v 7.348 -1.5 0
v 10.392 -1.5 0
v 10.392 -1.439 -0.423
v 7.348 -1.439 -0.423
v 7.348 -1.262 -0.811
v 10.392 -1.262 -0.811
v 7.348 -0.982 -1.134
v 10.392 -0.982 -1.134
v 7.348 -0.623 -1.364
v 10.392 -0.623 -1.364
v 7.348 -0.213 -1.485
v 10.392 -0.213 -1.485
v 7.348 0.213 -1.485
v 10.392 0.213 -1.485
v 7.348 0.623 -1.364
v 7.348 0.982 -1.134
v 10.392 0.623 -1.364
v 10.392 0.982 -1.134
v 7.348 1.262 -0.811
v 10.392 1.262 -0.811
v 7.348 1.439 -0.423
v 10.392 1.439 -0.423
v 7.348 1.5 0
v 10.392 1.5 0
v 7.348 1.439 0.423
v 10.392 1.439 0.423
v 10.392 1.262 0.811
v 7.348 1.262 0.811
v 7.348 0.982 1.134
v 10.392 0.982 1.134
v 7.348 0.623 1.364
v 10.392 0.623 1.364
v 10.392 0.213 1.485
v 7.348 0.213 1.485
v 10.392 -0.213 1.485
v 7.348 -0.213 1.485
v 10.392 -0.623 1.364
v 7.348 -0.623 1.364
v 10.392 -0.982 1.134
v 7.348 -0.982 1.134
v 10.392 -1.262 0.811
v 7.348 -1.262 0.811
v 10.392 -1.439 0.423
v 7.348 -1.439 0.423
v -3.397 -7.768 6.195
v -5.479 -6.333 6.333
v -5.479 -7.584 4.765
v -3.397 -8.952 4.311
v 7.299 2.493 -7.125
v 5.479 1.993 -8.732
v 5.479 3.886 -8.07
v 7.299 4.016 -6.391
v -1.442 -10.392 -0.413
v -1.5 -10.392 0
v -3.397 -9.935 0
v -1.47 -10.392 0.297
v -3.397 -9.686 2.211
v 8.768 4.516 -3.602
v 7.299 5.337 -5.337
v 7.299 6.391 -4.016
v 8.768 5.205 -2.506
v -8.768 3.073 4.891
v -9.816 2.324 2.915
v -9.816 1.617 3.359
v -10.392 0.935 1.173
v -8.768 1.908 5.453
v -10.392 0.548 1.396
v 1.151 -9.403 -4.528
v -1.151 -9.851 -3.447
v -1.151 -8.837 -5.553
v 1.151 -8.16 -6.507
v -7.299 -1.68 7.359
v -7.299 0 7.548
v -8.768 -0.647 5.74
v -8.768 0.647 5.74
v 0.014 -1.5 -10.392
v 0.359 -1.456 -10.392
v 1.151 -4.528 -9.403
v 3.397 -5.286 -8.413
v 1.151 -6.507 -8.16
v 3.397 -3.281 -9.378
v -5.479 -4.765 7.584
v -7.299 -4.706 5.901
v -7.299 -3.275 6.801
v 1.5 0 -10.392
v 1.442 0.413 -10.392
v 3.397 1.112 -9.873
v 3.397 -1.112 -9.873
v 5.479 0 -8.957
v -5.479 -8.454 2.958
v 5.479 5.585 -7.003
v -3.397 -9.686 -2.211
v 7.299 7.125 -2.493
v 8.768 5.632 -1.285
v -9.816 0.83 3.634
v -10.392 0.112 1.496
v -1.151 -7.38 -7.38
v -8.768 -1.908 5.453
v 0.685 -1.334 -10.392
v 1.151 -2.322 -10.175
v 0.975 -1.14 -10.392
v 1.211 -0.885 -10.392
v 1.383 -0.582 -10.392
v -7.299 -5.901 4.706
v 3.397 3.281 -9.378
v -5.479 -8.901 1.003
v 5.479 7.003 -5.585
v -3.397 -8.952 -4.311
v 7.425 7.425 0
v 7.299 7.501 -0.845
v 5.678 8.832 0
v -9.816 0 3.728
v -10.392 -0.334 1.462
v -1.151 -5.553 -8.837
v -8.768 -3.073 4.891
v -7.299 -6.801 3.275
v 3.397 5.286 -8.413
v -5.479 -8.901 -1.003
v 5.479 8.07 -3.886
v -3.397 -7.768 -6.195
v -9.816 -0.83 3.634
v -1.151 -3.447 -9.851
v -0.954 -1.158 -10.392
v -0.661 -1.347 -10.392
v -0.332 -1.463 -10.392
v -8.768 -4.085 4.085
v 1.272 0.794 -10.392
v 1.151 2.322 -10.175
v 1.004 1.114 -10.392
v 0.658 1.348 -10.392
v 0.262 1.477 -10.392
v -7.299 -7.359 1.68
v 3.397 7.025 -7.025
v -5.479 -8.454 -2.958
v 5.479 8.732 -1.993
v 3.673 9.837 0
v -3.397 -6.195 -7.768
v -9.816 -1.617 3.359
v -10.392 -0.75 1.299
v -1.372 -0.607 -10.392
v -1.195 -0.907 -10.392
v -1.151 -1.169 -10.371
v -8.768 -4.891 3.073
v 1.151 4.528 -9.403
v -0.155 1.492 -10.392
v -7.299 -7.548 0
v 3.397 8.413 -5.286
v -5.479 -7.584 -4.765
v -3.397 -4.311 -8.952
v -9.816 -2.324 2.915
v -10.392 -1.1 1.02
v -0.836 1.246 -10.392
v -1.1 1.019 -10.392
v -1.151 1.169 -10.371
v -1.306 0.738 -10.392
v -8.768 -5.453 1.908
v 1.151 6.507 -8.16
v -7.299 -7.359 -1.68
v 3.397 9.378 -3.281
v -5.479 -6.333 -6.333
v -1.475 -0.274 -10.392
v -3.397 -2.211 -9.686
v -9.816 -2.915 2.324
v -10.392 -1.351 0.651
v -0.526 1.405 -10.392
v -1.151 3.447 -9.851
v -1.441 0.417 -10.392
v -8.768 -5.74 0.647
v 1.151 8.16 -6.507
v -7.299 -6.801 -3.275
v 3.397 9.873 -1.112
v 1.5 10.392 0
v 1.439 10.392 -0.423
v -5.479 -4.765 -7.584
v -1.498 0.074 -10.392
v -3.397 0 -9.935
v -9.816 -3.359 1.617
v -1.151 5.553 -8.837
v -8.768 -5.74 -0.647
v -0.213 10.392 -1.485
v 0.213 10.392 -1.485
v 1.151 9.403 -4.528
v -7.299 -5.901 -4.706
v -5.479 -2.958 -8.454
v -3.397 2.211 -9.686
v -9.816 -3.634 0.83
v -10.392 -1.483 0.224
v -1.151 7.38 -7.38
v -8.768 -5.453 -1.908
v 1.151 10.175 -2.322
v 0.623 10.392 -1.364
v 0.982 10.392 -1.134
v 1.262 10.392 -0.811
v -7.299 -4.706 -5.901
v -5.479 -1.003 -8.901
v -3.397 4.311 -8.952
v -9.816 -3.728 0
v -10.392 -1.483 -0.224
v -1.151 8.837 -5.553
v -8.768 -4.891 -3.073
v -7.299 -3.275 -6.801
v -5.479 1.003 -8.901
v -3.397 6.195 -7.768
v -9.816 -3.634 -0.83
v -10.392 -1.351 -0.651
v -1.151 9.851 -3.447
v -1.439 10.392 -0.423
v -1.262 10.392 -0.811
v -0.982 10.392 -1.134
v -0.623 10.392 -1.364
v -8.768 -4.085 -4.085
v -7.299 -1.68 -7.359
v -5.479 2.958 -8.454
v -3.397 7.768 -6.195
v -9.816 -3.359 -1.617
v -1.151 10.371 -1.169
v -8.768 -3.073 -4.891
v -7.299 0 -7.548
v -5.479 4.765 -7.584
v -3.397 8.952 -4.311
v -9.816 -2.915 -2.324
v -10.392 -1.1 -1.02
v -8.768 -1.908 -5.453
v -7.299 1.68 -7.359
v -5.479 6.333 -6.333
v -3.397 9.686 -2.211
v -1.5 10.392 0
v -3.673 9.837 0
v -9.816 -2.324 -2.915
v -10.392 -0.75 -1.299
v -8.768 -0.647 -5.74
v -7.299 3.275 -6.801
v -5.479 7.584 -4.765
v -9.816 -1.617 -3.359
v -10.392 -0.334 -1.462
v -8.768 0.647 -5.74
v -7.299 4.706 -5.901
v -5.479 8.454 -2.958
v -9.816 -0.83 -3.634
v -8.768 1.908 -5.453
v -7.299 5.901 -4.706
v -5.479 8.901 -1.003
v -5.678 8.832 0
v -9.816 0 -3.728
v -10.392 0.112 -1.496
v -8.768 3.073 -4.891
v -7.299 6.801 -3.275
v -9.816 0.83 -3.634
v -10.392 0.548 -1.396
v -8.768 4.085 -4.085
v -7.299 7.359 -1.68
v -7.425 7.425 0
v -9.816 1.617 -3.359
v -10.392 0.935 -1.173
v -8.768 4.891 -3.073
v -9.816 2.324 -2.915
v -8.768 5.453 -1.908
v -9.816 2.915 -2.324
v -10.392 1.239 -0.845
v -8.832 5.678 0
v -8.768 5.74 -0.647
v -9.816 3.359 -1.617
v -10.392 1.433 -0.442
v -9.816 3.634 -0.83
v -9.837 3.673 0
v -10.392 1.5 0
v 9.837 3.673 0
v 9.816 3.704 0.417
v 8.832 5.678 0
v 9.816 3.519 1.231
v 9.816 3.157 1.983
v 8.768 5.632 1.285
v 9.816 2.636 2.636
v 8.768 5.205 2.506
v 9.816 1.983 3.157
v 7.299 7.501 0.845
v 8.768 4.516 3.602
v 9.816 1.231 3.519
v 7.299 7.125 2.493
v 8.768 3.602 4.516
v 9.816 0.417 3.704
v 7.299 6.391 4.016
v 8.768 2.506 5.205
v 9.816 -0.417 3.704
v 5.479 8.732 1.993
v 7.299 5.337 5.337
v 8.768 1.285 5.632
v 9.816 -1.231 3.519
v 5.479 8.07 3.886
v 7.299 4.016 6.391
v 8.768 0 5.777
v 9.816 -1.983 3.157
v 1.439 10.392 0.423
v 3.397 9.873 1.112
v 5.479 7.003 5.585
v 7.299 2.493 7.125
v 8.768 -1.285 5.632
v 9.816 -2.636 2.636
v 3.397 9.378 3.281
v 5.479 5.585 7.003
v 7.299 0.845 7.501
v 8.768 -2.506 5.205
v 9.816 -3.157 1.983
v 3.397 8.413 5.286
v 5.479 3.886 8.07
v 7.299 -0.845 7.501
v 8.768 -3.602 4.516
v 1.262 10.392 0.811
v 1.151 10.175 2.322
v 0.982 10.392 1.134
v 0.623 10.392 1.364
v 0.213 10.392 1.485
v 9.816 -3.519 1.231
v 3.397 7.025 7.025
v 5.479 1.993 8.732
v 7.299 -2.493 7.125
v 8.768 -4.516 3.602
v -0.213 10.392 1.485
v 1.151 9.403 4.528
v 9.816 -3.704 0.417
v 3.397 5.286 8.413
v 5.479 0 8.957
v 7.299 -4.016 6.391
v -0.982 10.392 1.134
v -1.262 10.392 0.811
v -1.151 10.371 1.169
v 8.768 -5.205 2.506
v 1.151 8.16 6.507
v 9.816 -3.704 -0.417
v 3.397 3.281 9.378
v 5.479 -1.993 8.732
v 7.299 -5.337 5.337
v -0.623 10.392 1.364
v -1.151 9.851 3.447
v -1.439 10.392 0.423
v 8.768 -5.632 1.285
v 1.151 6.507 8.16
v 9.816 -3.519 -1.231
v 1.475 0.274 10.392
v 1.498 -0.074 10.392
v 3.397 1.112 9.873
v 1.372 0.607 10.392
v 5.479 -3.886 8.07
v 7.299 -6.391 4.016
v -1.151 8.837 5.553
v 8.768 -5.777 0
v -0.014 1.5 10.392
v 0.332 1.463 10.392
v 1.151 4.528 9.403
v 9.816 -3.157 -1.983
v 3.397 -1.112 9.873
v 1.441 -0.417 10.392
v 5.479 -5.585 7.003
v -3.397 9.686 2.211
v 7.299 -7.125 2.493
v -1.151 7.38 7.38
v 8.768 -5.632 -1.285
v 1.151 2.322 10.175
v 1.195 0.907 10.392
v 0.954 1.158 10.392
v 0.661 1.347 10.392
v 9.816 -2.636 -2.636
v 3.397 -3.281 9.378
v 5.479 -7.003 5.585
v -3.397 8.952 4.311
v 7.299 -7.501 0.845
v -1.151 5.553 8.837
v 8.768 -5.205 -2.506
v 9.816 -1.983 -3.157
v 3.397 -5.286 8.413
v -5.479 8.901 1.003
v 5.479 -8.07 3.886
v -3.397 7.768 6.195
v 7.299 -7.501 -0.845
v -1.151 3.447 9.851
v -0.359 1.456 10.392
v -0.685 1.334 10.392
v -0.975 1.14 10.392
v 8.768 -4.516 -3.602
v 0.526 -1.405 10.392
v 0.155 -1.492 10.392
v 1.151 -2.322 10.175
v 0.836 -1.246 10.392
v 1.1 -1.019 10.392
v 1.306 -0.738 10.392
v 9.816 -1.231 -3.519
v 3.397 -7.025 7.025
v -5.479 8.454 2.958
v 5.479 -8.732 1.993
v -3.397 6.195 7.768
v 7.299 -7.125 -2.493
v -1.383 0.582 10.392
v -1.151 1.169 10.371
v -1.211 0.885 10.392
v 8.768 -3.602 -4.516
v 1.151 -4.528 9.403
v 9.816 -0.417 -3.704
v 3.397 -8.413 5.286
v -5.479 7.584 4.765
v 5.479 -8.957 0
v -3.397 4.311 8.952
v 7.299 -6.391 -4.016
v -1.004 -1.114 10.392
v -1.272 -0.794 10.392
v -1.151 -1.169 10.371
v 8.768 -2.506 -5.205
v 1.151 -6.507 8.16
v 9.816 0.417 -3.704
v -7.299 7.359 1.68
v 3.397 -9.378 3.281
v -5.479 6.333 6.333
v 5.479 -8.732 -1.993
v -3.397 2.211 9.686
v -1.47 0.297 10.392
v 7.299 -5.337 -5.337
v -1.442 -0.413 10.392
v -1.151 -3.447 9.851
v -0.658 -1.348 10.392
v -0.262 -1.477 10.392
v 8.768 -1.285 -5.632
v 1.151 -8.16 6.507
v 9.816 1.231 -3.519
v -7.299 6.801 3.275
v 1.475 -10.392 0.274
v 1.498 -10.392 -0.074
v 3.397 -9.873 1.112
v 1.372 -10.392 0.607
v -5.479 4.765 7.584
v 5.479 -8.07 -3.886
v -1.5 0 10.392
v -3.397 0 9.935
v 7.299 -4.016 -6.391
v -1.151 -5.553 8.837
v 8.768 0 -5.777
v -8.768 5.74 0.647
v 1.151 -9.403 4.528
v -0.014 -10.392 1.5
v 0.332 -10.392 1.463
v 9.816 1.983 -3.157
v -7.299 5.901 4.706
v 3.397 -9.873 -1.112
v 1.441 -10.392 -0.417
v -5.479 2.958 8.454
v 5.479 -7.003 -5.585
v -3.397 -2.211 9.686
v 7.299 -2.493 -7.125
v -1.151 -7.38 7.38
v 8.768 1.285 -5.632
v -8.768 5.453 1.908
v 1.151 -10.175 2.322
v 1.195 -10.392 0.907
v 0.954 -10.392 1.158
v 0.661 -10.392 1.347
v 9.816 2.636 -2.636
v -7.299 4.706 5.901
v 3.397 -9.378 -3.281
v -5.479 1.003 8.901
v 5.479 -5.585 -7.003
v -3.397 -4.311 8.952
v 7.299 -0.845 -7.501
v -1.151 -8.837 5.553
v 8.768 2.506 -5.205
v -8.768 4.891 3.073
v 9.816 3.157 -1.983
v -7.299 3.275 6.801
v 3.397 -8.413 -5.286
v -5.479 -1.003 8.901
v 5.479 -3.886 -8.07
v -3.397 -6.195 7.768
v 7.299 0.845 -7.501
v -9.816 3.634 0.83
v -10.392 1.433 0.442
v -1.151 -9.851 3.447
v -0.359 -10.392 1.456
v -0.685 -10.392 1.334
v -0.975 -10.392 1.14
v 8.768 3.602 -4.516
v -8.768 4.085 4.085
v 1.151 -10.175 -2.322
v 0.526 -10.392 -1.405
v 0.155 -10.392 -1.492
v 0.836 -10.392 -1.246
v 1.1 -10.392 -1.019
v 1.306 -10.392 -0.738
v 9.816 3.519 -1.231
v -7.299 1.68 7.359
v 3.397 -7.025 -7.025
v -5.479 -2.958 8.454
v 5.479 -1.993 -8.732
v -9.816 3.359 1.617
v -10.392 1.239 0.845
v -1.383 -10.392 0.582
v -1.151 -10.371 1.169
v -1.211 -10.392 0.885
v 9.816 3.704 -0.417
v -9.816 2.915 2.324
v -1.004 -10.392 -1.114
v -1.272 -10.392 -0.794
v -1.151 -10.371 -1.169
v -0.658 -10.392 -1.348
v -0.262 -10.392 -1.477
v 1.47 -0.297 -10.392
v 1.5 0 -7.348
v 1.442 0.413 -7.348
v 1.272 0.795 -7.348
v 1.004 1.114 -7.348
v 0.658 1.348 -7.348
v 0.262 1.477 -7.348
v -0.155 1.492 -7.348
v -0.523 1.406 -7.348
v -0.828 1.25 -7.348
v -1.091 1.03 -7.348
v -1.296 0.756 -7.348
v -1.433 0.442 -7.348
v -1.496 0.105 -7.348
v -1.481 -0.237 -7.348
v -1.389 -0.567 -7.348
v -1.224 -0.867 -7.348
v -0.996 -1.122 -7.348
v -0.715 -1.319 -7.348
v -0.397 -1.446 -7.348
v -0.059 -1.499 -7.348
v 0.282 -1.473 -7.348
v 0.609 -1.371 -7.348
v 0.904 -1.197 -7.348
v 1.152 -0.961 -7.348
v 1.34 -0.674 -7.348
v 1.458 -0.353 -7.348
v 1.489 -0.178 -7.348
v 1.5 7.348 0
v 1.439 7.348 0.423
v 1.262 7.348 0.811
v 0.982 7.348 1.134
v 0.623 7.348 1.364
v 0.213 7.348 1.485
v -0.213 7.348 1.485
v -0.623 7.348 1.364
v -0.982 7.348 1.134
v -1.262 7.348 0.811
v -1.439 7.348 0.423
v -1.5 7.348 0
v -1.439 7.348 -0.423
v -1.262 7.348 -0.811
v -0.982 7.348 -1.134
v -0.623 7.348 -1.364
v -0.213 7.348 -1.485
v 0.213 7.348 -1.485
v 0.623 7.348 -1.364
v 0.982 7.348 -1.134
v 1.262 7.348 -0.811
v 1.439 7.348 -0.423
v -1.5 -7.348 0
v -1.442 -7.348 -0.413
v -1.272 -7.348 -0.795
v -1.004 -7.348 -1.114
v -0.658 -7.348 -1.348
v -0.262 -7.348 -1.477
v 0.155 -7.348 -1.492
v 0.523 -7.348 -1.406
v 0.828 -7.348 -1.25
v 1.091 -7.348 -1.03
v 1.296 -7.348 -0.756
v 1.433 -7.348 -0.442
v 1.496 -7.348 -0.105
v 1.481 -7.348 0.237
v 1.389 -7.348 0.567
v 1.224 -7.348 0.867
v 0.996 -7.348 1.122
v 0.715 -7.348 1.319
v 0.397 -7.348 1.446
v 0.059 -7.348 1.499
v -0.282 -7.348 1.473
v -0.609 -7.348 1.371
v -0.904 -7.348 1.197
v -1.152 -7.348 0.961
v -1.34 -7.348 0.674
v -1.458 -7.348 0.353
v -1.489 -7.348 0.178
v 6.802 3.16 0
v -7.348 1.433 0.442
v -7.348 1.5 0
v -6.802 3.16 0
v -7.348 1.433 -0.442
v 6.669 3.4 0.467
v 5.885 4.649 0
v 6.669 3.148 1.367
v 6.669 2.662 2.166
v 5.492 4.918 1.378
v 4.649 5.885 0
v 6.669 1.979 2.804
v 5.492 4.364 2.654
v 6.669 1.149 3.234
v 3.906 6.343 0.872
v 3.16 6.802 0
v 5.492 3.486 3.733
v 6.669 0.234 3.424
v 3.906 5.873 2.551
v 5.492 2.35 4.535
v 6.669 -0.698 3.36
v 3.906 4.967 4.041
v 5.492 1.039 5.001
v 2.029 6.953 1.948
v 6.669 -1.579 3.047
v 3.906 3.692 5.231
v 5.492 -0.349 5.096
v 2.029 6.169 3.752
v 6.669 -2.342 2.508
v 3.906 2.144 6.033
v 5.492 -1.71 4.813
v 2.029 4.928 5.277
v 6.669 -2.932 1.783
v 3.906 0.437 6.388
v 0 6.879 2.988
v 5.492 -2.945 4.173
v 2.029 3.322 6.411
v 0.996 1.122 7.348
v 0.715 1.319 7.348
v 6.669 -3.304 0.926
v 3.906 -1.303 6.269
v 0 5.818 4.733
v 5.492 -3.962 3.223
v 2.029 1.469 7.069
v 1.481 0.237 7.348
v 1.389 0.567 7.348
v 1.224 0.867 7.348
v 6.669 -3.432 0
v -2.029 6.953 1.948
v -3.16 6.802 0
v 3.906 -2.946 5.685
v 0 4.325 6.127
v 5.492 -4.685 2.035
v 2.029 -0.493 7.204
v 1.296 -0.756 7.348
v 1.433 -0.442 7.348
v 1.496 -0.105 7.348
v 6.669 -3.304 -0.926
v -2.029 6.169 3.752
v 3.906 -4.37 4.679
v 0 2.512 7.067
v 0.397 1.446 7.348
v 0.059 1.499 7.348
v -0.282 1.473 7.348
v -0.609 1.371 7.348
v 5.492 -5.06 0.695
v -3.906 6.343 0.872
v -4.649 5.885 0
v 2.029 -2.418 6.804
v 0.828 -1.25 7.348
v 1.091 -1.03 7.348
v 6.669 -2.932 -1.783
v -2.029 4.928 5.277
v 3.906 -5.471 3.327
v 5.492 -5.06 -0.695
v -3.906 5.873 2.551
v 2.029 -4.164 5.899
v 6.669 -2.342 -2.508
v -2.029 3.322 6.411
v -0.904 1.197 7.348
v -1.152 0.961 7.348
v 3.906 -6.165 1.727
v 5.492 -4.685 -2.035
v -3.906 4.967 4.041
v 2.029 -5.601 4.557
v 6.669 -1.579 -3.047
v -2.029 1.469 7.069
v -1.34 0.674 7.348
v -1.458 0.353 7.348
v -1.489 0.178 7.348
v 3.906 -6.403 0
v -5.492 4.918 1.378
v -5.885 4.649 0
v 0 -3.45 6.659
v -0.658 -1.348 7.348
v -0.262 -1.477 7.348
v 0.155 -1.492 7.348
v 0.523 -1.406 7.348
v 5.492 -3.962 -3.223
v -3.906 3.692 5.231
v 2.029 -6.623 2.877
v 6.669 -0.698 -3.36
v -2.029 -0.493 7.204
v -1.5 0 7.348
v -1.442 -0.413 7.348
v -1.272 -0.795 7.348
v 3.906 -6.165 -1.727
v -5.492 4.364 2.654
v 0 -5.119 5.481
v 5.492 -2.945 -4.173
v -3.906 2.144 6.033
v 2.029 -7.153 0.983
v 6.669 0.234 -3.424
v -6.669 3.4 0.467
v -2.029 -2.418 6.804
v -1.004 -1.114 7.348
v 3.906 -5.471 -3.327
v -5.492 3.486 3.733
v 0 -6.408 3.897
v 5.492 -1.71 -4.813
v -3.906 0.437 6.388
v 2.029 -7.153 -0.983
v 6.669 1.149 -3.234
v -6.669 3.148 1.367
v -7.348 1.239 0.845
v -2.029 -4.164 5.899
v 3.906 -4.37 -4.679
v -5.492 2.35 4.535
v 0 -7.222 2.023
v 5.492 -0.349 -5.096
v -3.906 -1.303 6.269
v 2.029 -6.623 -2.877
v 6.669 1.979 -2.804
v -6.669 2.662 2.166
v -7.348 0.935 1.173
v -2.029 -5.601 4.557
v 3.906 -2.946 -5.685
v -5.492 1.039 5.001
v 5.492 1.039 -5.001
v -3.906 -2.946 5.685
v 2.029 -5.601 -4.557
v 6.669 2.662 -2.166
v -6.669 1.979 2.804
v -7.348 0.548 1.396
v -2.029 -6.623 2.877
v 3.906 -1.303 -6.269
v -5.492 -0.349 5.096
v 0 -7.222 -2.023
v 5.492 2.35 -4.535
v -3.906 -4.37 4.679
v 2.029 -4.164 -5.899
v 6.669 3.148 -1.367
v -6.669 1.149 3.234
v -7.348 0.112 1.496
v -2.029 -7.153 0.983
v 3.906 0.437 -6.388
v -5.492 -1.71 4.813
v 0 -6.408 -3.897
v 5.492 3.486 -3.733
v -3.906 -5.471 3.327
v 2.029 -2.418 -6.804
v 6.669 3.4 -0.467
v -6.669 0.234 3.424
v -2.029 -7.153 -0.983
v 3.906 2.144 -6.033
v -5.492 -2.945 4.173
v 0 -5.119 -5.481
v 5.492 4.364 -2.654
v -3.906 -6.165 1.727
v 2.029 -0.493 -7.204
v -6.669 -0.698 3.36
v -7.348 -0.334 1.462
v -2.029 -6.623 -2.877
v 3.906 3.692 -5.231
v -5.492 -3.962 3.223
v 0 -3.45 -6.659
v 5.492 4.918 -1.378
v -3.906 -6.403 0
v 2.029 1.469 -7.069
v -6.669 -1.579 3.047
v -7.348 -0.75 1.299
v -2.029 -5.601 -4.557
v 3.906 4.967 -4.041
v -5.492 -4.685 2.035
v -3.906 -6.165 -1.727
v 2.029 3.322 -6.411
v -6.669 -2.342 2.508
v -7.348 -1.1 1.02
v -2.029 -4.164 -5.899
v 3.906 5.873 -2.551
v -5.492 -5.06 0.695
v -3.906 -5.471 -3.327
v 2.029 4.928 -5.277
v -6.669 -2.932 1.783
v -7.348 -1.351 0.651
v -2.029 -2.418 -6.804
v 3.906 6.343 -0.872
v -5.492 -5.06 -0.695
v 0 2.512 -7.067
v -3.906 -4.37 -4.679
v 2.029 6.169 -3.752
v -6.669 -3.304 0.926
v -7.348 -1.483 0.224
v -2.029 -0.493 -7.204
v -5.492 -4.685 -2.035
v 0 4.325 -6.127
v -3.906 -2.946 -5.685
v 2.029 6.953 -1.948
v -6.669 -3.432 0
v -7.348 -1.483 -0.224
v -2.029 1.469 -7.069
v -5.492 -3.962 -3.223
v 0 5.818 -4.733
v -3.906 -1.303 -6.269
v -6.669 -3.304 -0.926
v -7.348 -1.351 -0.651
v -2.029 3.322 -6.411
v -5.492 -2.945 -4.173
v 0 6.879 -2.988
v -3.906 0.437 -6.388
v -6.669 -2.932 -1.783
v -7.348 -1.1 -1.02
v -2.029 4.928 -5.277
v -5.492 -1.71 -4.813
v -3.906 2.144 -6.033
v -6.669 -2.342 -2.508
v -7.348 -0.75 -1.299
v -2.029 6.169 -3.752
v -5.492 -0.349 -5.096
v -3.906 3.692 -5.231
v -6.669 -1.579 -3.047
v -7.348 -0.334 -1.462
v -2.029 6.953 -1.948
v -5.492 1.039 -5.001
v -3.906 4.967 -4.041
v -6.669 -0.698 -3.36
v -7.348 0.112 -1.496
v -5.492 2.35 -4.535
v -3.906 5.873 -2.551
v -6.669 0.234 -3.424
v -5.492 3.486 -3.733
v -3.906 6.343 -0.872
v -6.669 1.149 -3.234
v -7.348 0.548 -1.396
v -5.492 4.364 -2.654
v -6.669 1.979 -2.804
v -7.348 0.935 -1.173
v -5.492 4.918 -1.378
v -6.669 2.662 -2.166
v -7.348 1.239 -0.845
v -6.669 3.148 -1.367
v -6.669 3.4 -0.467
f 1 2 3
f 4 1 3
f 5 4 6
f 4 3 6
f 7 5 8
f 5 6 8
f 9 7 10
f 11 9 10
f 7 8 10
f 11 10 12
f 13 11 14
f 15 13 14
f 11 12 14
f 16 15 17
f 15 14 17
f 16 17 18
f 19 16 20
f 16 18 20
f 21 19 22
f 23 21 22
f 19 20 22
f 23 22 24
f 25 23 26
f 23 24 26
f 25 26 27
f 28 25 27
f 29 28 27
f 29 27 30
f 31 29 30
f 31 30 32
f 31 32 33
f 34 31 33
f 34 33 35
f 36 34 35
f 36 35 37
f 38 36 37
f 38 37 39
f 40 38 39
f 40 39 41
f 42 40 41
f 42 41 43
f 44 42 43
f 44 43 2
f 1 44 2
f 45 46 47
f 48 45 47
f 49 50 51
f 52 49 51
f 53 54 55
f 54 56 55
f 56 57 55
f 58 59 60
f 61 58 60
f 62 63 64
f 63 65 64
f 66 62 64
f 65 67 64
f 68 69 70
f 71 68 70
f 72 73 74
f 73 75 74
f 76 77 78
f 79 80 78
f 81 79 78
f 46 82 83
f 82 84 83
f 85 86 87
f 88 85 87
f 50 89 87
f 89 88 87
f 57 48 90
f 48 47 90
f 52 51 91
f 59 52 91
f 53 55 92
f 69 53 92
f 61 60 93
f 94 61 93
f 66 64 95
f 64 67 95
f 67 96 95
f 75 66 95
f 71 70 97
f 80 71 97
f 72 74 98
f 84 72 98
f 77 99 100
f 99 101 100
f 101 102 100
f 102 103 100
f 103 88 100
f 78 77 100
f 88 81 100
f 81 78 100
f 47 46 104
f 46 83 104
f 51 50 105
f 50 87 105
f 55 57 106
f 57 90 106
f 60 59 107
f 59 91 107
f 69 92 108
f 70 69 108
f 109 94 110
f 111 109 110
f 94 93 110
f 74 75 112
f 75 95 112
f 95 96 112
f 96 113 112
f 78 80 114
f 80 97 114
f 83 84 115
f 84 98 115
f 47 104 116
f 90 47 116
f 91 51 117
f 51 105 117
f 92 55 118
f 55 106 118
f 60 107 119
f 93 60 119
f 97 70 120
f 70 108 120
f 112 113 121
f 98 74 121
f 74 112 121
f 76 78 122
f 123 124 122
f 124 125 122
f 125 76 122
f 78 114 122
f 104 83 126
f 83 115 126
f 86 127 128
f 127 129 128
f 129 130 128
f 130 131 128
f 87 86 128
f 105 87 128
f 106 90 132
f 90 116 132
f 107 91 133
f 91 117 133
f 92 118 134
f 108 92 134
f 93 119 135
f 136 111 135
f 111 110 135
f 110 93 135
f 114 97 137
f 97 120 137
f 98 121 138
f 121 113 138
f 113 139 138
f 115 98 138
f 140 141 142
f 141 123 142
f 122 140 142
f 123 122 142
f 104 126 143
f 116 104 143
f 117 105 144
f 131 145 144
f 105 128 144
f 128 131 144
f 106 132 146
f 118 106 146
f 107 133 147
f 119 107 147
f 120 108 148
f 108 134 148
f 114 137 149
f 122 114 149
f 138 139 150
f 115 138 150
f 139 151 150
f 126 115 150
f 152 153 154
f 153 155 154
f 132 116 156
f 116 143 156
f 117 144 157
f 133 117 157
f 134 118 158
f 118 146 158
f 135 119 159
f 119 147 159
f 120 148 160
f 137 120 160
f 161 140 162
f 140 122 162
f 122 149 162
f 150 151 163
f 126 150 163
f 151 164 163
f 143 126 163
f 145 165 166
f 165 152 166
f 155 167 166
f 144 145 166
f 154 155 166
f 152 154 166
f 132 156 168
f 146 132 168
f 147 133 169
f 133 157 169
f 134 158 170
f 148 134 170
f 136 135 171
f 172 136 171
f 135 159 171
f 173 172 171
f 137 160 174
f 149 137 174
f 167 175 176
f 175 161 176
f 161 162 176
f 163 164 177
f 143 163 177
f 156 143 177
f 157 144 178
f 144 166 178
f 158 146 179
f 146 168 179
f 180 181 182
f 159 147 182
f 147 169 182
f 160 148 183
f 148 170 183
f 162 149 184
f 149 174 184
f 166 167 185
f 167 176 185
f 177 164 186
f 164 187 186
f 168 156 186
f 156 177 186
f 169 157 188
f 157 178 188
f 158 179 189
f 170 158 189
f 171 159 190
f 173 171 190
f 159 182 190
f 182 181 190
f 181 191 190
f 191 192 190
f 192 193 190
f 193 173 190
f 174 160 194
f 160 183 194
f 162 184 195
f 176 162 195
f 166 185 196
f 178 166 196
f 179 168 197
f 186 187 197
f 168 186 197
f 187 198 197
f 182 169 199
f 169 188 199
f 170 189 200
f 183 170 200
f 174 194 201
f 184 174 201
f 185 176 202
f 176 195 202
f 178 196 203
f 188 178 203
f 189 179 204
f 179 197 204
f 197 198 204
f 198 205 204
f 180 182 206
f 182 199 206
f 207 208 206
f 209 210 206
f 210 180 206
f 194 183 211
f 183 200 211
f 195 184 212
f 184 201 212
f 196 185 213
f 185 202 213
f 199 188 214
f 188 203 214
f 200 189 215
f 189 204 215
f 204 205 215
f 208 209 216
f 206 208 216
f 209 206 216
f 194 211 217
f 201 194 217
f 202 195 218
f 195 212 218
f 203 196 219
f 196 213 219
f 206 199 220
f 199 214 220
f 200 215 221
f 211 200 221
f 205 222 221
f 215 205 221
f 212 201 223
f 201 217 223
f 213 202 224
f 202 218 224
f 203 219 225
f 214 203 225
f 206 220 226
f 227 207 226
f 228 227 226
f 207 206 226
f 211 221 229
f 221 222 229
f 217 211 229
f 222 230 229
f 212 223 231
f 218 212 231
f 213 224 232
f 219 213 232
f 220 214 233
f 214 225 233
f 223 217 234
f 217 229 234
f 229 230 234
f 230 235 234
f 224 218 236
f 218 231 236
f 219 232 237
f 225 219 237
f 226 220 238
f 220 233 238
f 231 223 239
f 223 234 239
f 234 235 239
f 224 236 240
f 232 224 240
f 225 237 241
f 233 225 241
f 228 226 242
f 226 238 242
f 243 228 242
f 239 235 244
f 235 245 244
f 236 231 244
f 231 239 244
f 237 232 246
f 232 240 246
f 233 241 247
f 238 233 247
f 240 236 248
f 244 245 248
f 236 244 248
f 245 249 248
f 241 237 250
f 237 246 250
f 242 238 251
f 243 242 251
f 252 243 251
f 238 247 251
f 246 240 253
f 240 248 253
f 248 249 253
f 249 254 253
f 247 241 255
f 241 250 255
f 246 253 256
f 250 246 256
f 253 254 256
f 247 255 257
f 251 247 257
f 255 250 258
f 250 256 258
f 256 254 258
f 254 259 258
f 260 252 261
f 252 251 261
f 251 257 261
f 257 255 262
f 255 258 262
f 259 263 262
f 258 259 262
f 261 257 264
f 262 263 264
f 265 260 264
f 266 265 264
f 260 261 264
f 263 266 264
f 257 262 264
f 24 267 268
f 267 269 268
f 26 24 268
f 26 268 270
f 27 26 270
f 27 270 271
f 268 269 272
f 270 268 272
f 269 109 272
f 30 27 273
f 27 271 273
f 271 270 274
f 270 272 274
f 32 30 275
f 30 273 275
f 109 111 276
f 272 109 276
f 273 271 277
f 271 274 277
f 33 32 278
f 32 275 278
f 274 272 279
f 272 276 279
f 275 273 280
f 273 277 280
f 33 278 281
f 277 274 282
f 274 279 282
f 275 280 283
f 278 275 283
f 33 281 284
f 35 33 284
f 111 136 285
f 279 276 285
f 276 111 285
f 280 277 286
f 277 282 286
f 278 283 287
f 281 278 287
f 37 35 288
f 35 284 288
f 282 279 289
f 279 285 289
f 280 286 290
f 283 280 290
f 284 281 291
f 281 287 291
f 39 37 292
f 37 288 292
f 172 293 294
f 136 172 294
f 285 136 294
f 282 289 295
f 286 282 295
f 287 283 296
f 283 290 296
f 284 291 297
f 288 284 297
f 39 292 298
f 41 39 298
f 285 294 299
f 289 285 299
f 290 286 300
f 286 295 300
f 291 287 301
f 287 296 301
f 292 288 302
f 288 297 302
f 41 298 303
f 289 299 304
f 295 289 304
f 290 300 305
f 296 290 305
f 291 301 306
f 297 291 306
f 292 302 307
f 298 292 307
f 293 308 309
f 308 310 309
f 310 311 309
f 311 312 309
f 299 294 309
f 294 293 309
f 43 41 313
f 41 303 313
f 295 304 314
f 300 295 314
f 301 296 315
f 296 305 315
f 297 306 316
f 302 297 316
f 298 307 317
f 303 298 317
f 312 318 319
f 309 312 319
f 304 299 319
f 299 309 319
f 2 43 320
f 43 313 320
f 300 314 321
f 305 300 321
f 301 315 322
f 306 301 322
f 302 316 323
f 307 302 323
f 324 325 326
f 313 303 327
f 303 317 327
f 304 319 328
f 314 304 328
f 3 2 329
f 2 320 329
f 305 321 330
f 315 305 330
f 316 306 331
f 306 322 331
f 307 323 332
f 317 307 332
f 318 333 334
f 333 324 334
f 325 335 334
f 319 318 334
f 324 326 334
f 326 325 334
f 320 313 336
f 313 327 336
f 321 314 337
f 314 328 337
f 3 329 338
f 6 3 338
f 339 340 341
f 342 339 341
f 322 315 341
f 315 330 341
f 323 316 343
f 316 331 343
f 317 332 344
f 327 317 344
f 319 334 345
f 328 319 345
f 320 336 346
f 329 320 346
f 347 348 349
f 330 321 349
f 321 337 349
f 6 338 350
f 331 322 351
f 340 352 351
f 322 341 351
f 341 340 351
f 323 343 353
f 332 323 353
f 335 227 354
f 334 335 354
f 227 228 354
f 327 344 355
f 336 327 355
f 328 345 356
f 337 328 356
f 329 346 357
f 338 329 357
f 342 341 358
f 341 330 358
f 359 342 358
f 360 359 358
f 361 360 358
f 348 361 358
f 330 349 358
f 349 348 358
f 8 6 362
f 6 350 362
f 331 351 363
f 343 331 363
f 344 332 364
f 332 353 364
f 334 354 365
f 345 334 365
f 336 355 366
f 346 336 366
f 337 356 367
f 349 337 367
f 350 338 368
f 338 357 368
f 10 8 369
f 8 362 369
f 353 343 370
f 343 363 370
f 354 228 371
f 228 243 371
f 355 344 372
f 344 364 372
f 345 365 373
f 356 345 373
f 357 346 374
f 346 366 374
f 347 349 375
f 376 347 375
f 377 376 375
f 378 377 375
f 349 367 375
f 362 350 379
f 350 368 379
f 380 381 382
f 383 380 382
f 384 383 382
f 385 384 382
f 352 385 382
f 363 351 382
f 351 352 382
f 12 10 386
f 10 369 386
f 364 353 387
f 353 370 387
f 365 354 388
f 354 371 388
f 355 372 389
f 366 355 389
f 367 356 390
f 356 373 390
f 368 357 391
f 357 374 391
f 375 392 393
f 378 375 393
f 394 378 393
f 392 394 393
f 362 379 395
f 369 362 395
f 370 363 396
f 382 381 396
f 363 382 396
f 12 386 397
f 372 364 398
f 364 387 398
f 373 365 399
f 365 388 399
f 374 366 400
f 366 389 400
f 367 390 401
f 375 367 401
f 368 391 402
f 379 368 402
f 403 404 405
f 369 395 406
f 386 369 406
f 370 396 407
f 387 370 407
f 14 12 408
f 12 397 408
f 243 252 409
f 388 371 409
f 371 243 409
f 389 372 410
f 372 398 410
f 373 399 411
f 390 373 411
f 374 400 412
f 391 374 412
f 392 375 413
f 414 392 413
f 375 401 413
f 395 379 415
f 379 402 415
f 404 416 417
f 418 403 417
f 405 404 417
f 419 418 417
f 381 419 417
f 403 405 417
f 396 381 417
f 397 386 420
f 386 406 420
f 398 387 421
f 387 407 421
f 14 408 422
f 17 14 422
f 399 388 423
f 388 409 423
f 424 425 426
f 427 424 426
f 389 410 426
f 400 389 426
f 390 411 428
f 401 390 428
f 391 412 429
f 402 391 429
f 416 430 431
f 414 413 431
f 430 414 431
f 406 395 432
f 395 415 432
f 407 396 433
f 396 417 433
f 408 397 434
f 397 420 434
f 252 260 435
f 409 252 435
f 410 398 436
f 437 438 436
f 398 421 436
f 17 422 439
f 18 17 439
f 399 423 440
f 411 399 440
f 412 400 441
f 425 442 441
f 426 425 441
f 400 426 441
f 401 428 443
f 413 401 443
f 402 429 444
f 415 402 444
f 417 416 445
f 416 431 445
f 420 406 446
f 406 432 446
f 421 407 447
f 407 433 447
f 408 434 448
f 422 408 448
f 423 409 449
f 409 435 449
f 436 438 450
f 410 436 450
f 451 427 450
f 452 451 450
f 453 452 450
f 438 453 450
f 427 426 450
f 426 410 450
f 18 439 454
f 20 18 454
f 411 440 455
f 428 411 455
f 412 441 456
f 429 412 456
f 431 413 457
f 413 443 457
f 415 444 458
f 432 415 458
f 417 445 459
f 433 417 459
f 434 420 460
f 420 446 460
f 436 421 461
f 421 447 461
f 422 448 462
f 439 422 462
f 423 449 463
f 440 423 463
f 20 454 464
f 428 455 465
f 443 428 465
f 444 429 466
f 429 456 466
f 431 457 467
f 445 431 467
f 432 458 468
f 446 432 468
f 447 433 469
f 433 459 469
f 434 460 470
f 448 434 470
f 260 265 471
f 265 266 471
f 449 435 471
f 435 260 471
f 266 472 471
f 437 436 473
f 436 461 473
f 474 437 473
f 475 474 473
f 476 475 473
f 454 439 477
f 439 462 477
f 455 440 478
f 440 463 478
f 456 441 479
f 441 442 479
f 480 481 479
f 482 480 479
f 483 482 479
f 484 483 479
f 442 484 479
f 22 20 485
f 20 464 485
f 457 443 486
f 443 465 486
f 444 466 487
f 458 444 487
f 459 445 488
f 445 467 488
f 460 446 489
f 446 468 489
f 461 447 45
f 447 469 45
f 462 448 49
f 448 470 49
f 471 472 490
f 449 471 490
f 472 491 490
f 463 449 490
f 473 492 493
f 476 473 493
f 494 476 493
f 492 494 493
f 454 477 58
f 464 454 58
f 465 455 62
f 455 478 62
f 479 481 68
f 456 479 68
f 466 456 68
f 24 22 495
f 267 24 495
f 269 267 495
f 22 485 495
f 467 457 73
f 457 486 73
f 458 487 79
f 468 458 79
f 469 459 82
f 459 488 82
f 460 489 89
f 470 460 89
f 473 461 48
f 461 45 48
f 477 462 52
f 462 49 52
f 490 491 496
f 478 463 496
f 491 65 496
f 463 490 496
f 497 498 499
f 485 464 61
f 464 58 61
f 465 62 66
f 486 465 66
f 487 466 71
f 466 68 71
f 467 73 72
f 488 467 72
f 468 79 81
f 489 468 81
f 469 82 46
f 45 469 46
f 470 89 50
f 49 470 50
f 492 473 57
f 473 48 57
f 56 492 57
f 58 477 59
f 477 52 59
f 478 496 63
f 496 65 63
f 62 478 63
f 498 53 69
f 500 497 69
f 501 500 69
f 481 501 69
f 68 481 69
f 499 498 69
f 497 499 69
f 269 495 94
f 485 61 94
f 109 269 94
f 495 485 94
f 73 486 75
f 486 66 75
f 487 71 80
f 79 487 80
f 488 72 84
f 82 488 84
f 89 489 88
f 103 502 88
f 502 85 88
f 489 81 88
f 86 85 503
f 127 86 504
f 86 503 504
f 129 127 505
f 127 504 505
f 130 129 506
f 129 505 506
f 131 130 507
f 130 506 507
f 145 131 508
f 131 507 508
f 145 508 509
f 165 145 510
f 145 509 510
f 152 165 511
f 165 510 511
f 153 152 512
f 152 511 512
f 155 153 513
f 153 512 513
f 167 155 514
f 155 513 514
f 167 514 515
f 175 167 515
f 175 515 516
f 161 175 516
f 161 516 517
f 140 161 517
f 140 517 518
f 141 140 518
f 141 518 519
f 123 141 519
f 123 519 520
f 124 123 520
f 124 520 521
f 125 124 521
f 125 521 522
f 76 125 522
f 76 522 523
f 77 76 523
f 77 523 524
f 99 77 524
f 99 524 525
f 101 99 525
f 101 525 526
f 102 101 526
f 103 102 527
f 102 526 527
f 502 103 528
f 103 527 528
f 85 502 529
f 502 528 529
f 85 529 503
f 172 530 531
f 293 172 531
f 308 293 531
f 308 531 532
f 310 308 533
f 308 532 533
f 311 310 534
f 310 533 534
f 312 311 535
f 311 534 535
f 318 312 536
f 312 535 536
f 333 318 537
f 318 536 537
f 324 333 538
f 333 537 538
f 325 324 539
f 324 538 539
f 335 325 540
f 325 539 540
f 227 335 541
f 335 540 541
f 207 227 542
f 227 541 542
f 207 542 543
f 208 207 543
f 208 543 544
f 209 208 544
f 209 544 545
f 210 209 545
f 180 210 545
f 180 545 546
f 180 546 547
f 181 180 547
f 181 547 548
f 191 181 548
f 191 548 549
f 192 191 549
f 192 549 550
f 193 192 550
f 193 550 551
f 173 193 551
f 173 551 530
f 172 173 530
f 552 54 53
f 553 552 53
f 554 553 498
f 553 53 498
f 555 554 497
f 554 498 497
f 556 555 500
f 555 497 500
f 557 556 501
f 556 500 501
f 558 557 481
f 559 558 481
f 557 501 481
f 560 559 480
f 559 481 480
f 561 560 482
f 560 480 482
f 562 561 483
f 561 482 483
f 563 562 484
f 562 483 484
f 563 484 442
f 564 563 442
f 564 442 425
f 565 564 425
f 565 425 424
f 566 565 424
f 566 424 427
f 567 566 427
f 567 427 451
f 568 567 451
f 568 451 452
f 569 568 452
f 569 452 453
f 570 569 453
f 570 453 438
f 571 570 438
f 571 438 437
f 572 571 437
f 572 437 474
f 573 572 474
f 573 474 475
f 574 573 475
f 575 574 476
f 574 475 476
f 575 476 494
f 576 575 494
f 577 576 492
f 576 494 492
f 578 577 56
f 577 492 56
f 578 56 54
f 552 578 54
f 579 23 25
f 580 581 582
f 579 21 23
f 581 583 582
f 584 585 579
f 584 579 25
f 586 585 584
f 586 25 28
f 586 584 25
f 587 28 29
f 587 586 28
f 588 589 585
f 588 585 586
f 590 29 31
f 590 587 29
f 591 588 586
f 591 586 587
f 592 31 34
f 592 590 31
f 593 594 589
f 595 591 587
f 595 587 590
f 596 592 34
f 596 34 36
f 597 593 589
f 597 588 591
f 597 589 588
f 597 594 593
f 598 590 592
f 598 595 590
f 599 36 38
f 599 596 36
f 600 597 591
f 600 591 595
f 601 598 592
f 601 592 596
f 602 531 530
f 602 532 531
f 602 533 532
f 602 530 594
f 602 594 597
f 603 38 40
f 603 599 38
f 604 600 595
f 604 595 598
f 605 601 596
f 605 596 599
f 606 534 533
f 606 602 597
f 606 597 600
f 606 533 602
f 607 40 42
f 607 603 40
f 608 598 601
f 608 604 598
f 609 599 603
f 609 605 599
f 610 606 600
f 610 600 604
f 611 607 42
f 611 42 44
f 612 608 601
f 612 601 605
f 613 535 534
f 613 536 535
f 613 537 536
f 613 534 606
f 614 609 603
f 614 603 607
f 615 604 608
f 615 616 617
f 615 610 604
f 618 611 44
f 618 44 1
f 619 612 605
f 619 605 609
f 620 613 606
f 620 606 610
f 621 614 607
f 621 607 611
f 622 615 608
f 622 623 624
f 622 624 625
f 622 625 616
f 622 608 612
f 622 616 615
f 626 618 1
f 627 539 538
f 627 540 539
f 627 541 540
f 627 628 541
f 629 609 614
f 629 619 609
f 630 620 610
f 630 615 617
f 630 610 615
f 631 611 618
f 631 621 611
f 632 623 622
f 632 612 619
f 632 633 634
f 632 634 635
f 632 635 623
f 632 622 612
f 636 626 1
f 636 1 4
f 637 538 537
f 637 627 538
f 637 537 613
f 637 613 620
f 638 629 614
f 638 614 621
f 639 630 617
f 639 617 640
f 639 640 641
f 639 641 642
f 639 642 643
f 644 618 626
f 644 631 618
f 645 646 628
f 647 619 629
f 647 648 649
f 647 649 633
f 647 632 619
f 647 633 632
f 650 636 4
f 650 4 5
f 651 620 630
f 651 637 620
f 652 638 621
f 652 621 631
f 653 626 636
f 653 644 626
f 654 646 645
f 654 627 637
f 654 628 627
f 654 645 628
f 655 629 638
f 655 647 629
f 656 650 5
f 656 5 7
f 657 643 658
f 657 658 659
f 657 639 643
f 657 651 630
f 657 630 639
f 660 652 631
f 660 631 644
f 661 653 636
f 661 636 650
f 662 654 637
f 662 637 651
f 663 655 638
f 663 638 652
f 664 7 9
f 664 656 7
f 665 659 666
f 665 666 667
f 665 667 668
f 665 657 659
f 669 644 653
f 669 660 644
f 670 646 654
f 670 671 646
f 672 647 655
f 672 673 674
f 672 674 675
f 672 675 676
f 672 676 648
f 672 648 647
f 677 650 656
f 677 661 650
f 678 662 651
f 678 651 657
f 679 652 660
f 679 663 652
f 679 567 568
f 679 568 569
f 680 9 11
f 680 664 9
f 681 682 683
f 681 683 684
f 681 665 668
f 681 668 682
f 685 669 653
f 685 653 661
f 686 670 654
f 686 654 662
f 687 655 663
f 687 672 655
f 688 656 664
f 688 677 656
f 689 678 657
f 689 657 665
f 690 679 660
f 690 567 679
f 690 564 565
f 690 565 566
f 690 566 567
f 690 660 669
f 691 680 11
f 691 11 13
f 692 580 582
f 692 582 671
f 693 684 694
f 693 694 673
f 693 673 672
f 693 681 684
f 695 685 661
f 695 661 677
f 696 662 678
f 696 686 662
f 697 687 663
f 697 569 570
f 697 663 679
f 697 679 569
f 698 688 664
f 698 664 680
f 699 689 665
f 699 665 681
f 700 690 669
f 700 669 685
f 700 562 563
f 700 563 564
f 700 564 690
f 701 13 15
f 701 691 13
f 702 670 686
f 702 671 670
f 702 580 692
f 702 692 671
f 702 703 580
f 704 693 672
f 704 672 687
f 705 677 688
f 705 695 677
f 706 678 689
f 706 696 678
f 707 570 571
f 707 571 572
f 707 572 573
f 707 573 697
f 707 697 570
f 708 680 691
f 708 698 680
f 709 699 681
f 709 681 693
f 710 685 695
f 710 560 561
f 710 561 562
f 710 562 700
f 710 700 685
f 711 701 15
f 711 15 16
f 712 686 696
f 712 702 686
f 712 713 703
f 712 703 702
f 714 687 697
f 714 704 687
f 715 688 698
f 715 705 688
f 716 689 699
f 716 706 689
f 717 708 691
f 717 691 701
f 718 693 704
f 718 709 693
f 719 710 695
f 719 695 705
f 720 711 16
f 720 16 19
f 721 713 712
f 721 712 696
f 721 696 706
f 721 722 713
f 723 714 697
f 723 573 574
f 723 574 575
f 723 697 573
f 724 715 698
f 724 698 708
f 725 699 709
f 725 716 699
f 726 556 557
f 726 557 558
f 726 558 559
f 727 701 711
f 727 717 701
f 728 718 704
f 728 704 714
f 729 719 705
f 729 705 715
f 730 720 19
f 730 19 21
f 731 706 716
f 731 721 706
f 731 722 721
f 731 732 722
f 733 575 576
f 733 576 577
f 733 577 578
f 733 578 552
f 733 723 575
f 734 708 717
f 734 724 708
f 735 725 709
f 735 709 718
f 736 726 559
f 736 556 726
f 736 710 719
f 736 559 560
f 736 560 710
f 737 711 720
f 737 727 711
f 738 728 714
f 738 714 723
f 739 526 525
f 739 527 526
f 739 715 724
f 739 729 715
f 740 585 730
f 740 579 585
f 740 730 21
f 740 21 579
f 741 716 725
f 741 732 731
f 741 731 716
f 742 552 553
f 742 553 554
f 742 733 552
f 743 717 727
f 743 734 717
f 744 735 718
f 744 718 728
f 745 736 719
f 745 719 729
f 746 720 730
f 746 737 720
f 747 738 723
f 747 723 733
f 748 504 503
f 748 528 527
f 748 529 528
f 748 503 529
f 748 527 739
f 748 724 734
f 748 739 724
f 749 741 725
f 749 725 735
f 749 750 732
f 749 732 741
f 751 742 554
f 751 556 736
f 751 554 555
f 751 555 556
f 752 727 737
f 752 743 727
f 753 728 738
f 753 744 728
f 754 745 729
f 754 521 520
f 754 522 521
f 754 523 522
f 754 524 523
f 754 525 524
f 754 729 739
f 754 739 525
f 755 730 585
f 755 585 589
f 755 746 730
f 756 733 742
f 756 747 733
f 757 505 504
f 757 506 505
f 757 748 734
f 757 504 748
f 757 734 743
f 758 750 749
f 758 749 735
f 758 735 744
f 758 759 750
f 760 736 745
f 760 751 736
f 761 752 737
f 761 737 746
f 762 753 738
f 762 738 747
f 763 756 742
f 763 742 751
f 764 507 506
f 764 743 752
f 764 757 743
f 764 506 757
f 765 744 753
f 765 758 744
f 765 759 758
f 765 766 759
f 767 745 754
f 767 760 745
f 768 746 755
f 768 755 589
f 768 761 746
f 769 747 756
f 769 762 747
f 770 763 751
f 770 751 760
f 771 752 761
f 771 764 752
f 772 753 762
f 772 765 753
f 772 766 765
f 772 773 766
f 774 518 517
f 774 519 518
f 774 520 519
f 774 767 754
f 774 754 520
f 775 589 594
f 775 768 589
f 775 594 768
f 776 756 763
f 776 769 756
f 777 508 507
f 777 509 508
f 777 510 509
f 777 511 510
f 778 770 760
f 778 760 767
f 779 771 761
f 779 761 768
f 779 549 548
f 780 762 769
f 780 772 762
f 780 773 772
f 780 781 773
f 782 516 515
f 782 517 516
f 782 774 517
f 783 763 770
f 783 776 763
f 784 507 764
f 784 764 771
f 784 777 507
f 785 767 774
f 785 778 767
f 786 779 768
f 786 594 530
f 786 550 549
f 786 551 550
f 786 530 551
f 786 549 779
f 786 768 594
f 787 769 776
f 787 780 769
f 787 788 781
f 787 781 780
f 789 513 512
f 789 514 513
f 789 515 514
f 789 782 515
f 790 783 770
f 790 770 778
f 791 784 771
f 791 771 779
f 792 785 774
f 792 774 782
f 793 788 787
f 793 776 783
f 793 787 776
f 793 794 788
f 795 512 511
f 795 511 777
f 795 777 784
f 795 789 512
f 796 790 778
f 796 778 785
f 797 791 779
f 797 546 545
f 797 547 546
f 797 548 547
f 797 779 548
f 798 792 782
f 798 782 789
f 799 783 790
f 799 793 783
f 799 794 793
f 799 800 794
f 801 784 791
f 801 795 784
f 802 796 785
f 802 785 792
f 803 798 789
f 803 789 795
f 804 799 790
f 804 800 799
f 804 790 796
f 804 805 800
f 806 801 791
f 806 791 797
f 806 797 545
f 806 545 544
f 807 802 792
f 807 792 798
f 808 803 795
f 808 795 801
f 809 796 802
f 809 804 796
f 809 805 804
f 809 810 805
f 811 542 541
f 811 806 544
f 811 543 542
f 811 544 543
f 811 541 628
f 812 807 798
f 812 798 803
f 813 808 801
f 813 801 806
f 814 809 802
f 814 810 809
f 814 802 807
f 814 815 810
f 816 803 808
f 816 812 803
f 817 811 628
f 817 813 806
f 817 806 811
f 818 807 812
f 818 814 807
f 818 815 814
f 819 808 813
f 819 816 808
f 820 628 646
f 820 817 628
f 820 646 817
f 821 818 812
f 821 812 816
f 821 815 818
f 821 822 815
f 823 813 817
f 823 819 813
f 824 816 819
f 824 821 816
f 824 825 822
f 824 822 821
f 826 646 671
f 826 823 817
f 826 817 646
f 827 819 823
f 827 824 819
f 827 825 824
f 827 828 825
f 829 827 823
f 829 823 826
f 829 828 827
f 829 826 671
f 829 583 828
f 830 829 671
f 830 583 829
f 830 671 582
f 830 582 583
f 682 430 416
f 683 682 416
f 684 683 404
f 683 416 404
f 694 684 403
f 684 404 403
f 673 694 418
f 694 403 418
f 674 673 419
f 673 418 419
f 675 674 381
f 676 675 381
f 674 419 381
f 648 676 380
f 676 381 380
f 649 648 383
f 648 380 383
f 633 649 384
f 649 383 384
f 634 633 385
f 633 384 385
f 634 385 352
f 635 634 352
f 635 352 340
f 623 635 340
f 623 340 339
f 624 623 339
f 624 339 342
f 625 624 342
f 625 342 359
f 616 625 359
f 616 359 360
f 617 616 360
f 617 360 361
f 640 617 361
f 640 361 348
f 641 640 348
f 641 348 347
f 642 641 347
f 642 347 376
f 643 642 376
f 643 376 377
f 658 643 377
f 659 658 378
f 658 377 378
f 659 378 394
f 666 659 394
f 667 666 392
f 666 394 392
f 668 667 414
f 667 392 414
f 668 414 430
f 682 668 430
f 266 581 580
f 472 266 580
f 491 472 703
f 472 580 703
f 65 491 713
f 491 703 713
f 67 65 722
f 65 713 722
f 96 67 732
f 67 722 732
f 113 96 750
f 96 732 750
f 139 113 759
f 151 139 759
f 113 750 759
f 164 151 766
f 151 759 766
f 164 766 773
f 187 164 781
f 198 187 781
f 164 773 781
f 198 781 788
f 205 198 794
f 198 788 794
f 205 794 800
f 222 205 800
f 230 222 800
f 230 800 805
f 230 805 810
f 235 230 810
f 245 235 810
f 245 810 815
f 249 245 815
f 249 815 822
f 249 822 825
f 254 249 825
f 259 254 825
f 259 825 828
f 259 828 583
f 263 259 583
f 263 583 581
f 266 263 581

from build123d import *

# Parameters (mm, degrees)
F2_T      = -3
F4_D      = 3
F4_DEPTH  = 10.501
F6_D      = 3
F8_D      = 3
F8_DEPTH  = 10.501
F10_D     = 3
F12_D     = 3
F12_DEPTH = 10.501
F14_D     = 3


with BuildPart() as f1:
    # F0 (on Top) → F1 (revolve)
    with BuildSketch(Plane.XY):
        with BuildLine():
            ThreePointArc((10.5, 0), (0, 10.5), (-10.5, 0))
            Line((-10.5, 0), (10.5, 0))
        make_face()
    revolve(axis=Axis((0.3997717993, 0, 0), (1, 0, 0)))

    # F2 (hollow: no face is removed)
    offset(amount=F2_T, mode=Mode.SUBTRACT)

    # F4 (through all, one way)
    with BuildSketch(Plane.XY):
        with Locations((0, 0)):
            Circle(F4_D / 2)
    extrude(amount=-F4_DEPTH, mode=Mode.SUBTRACT)

    # F6 (through all)
    with Locations(Plane(origin=(0, 0, 0), x_dir=(1, 0, 0), z_dir=(0, 0, -1))):
        with Locations((0, 0)):
            Hole(F6_D / 2)

    # F8 (through all, one way)
    with BuildSketch(Plane.YZ):
        with Locations((0, 0)):
            Circle(F8_D / 2)
    extrude(amount=-F8_DEPTH, mode=Mode.SUBTRACT)

    # F10 (through all)
    with Locations(Plane(origin=(0, 0, 0), x_dir=(0, 1, 0), z_dir=(-1, 0, 0))):
        with Locations((0, 0)):
            Hole(F10_D / 2)

    # F12 (through all, one way)
    with BuildSketch(Plane.XZ):
        with Locations((0, 0)):
            Circle(F12_D / 2)
    extrude(amount=-F12_DEPTH, mode=Mode.SUBTRACT)

    # F14 (through all)
    with Locations(Plane(origin=(0, 0, 0), x_dir=(1, 0, 0), z_dir=(0, 1, 0))):
        with Locations((0, 0)):
            Hole(F14_D / 2)


solid = f1.part
